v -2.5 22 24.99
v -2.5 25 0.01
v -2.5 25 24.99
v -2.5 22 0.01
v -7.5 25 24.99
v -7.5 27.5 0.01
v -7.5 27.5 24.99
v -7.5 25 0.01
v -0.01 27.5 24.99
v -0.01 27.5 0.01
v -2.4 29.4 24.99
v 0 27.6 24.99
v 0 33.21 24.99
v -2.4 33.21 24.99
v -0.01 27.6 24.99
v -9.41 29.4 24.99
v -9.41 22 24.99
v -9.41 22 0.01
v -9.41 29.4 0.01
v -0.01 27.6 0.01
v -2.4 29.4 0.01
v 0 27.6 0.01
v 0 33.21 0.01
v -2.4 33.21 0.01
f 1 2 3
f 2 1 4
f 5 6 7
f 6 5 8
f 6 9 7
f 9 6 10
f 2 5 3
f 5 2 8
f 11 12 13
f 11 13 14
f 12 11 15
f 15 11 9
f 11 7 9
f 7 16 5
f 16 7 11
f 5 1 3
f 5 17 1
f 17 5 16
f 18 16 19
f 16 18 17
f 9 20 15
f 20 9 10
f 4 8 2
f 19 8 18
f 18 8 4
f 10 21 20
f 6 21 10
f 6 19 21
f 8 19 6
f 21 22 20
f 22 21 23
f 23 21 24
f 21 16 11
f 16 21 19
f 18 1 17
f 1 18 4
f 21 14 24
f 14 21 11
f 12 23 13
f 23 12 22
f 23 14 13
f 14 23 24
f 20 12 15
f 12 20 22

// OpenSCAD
// Measurements are based on jig recommendations

angle = 35;
size = 25;

h = 25;

wall=2.5; // because it seems to work

text_depth = .4  * 2; // set to a ratio of your extruder width

// A global overlap variable (to prevent printing glitches)
$o = .06;

// Render the part
chisel_sharpening_jig_key();

/* ******************************************************************************
 * Main module code below:
 * ****************************************************************************** */

module chisel_sharpening_jig_key() {
    rotate([0,-90,0])
    union(){
        difference(){
            translate([0.01,22,0.01]) cube([24.98,7.4,9.4]);
            union() {
                cube([h, size + .1, wall]);
                translate([0,size, 0])
                    cube([h, wall, 5+wall]);
                translate([0,0,-15+$o])
                    cube([h, wall, 15+$o]);
                *translate([0,0, 0])
                    cube([wall, size, 10]);
            }
        }
        translate([0.01,27.6,0]) cube([24.98,5.61,2.4]);
    }
}
